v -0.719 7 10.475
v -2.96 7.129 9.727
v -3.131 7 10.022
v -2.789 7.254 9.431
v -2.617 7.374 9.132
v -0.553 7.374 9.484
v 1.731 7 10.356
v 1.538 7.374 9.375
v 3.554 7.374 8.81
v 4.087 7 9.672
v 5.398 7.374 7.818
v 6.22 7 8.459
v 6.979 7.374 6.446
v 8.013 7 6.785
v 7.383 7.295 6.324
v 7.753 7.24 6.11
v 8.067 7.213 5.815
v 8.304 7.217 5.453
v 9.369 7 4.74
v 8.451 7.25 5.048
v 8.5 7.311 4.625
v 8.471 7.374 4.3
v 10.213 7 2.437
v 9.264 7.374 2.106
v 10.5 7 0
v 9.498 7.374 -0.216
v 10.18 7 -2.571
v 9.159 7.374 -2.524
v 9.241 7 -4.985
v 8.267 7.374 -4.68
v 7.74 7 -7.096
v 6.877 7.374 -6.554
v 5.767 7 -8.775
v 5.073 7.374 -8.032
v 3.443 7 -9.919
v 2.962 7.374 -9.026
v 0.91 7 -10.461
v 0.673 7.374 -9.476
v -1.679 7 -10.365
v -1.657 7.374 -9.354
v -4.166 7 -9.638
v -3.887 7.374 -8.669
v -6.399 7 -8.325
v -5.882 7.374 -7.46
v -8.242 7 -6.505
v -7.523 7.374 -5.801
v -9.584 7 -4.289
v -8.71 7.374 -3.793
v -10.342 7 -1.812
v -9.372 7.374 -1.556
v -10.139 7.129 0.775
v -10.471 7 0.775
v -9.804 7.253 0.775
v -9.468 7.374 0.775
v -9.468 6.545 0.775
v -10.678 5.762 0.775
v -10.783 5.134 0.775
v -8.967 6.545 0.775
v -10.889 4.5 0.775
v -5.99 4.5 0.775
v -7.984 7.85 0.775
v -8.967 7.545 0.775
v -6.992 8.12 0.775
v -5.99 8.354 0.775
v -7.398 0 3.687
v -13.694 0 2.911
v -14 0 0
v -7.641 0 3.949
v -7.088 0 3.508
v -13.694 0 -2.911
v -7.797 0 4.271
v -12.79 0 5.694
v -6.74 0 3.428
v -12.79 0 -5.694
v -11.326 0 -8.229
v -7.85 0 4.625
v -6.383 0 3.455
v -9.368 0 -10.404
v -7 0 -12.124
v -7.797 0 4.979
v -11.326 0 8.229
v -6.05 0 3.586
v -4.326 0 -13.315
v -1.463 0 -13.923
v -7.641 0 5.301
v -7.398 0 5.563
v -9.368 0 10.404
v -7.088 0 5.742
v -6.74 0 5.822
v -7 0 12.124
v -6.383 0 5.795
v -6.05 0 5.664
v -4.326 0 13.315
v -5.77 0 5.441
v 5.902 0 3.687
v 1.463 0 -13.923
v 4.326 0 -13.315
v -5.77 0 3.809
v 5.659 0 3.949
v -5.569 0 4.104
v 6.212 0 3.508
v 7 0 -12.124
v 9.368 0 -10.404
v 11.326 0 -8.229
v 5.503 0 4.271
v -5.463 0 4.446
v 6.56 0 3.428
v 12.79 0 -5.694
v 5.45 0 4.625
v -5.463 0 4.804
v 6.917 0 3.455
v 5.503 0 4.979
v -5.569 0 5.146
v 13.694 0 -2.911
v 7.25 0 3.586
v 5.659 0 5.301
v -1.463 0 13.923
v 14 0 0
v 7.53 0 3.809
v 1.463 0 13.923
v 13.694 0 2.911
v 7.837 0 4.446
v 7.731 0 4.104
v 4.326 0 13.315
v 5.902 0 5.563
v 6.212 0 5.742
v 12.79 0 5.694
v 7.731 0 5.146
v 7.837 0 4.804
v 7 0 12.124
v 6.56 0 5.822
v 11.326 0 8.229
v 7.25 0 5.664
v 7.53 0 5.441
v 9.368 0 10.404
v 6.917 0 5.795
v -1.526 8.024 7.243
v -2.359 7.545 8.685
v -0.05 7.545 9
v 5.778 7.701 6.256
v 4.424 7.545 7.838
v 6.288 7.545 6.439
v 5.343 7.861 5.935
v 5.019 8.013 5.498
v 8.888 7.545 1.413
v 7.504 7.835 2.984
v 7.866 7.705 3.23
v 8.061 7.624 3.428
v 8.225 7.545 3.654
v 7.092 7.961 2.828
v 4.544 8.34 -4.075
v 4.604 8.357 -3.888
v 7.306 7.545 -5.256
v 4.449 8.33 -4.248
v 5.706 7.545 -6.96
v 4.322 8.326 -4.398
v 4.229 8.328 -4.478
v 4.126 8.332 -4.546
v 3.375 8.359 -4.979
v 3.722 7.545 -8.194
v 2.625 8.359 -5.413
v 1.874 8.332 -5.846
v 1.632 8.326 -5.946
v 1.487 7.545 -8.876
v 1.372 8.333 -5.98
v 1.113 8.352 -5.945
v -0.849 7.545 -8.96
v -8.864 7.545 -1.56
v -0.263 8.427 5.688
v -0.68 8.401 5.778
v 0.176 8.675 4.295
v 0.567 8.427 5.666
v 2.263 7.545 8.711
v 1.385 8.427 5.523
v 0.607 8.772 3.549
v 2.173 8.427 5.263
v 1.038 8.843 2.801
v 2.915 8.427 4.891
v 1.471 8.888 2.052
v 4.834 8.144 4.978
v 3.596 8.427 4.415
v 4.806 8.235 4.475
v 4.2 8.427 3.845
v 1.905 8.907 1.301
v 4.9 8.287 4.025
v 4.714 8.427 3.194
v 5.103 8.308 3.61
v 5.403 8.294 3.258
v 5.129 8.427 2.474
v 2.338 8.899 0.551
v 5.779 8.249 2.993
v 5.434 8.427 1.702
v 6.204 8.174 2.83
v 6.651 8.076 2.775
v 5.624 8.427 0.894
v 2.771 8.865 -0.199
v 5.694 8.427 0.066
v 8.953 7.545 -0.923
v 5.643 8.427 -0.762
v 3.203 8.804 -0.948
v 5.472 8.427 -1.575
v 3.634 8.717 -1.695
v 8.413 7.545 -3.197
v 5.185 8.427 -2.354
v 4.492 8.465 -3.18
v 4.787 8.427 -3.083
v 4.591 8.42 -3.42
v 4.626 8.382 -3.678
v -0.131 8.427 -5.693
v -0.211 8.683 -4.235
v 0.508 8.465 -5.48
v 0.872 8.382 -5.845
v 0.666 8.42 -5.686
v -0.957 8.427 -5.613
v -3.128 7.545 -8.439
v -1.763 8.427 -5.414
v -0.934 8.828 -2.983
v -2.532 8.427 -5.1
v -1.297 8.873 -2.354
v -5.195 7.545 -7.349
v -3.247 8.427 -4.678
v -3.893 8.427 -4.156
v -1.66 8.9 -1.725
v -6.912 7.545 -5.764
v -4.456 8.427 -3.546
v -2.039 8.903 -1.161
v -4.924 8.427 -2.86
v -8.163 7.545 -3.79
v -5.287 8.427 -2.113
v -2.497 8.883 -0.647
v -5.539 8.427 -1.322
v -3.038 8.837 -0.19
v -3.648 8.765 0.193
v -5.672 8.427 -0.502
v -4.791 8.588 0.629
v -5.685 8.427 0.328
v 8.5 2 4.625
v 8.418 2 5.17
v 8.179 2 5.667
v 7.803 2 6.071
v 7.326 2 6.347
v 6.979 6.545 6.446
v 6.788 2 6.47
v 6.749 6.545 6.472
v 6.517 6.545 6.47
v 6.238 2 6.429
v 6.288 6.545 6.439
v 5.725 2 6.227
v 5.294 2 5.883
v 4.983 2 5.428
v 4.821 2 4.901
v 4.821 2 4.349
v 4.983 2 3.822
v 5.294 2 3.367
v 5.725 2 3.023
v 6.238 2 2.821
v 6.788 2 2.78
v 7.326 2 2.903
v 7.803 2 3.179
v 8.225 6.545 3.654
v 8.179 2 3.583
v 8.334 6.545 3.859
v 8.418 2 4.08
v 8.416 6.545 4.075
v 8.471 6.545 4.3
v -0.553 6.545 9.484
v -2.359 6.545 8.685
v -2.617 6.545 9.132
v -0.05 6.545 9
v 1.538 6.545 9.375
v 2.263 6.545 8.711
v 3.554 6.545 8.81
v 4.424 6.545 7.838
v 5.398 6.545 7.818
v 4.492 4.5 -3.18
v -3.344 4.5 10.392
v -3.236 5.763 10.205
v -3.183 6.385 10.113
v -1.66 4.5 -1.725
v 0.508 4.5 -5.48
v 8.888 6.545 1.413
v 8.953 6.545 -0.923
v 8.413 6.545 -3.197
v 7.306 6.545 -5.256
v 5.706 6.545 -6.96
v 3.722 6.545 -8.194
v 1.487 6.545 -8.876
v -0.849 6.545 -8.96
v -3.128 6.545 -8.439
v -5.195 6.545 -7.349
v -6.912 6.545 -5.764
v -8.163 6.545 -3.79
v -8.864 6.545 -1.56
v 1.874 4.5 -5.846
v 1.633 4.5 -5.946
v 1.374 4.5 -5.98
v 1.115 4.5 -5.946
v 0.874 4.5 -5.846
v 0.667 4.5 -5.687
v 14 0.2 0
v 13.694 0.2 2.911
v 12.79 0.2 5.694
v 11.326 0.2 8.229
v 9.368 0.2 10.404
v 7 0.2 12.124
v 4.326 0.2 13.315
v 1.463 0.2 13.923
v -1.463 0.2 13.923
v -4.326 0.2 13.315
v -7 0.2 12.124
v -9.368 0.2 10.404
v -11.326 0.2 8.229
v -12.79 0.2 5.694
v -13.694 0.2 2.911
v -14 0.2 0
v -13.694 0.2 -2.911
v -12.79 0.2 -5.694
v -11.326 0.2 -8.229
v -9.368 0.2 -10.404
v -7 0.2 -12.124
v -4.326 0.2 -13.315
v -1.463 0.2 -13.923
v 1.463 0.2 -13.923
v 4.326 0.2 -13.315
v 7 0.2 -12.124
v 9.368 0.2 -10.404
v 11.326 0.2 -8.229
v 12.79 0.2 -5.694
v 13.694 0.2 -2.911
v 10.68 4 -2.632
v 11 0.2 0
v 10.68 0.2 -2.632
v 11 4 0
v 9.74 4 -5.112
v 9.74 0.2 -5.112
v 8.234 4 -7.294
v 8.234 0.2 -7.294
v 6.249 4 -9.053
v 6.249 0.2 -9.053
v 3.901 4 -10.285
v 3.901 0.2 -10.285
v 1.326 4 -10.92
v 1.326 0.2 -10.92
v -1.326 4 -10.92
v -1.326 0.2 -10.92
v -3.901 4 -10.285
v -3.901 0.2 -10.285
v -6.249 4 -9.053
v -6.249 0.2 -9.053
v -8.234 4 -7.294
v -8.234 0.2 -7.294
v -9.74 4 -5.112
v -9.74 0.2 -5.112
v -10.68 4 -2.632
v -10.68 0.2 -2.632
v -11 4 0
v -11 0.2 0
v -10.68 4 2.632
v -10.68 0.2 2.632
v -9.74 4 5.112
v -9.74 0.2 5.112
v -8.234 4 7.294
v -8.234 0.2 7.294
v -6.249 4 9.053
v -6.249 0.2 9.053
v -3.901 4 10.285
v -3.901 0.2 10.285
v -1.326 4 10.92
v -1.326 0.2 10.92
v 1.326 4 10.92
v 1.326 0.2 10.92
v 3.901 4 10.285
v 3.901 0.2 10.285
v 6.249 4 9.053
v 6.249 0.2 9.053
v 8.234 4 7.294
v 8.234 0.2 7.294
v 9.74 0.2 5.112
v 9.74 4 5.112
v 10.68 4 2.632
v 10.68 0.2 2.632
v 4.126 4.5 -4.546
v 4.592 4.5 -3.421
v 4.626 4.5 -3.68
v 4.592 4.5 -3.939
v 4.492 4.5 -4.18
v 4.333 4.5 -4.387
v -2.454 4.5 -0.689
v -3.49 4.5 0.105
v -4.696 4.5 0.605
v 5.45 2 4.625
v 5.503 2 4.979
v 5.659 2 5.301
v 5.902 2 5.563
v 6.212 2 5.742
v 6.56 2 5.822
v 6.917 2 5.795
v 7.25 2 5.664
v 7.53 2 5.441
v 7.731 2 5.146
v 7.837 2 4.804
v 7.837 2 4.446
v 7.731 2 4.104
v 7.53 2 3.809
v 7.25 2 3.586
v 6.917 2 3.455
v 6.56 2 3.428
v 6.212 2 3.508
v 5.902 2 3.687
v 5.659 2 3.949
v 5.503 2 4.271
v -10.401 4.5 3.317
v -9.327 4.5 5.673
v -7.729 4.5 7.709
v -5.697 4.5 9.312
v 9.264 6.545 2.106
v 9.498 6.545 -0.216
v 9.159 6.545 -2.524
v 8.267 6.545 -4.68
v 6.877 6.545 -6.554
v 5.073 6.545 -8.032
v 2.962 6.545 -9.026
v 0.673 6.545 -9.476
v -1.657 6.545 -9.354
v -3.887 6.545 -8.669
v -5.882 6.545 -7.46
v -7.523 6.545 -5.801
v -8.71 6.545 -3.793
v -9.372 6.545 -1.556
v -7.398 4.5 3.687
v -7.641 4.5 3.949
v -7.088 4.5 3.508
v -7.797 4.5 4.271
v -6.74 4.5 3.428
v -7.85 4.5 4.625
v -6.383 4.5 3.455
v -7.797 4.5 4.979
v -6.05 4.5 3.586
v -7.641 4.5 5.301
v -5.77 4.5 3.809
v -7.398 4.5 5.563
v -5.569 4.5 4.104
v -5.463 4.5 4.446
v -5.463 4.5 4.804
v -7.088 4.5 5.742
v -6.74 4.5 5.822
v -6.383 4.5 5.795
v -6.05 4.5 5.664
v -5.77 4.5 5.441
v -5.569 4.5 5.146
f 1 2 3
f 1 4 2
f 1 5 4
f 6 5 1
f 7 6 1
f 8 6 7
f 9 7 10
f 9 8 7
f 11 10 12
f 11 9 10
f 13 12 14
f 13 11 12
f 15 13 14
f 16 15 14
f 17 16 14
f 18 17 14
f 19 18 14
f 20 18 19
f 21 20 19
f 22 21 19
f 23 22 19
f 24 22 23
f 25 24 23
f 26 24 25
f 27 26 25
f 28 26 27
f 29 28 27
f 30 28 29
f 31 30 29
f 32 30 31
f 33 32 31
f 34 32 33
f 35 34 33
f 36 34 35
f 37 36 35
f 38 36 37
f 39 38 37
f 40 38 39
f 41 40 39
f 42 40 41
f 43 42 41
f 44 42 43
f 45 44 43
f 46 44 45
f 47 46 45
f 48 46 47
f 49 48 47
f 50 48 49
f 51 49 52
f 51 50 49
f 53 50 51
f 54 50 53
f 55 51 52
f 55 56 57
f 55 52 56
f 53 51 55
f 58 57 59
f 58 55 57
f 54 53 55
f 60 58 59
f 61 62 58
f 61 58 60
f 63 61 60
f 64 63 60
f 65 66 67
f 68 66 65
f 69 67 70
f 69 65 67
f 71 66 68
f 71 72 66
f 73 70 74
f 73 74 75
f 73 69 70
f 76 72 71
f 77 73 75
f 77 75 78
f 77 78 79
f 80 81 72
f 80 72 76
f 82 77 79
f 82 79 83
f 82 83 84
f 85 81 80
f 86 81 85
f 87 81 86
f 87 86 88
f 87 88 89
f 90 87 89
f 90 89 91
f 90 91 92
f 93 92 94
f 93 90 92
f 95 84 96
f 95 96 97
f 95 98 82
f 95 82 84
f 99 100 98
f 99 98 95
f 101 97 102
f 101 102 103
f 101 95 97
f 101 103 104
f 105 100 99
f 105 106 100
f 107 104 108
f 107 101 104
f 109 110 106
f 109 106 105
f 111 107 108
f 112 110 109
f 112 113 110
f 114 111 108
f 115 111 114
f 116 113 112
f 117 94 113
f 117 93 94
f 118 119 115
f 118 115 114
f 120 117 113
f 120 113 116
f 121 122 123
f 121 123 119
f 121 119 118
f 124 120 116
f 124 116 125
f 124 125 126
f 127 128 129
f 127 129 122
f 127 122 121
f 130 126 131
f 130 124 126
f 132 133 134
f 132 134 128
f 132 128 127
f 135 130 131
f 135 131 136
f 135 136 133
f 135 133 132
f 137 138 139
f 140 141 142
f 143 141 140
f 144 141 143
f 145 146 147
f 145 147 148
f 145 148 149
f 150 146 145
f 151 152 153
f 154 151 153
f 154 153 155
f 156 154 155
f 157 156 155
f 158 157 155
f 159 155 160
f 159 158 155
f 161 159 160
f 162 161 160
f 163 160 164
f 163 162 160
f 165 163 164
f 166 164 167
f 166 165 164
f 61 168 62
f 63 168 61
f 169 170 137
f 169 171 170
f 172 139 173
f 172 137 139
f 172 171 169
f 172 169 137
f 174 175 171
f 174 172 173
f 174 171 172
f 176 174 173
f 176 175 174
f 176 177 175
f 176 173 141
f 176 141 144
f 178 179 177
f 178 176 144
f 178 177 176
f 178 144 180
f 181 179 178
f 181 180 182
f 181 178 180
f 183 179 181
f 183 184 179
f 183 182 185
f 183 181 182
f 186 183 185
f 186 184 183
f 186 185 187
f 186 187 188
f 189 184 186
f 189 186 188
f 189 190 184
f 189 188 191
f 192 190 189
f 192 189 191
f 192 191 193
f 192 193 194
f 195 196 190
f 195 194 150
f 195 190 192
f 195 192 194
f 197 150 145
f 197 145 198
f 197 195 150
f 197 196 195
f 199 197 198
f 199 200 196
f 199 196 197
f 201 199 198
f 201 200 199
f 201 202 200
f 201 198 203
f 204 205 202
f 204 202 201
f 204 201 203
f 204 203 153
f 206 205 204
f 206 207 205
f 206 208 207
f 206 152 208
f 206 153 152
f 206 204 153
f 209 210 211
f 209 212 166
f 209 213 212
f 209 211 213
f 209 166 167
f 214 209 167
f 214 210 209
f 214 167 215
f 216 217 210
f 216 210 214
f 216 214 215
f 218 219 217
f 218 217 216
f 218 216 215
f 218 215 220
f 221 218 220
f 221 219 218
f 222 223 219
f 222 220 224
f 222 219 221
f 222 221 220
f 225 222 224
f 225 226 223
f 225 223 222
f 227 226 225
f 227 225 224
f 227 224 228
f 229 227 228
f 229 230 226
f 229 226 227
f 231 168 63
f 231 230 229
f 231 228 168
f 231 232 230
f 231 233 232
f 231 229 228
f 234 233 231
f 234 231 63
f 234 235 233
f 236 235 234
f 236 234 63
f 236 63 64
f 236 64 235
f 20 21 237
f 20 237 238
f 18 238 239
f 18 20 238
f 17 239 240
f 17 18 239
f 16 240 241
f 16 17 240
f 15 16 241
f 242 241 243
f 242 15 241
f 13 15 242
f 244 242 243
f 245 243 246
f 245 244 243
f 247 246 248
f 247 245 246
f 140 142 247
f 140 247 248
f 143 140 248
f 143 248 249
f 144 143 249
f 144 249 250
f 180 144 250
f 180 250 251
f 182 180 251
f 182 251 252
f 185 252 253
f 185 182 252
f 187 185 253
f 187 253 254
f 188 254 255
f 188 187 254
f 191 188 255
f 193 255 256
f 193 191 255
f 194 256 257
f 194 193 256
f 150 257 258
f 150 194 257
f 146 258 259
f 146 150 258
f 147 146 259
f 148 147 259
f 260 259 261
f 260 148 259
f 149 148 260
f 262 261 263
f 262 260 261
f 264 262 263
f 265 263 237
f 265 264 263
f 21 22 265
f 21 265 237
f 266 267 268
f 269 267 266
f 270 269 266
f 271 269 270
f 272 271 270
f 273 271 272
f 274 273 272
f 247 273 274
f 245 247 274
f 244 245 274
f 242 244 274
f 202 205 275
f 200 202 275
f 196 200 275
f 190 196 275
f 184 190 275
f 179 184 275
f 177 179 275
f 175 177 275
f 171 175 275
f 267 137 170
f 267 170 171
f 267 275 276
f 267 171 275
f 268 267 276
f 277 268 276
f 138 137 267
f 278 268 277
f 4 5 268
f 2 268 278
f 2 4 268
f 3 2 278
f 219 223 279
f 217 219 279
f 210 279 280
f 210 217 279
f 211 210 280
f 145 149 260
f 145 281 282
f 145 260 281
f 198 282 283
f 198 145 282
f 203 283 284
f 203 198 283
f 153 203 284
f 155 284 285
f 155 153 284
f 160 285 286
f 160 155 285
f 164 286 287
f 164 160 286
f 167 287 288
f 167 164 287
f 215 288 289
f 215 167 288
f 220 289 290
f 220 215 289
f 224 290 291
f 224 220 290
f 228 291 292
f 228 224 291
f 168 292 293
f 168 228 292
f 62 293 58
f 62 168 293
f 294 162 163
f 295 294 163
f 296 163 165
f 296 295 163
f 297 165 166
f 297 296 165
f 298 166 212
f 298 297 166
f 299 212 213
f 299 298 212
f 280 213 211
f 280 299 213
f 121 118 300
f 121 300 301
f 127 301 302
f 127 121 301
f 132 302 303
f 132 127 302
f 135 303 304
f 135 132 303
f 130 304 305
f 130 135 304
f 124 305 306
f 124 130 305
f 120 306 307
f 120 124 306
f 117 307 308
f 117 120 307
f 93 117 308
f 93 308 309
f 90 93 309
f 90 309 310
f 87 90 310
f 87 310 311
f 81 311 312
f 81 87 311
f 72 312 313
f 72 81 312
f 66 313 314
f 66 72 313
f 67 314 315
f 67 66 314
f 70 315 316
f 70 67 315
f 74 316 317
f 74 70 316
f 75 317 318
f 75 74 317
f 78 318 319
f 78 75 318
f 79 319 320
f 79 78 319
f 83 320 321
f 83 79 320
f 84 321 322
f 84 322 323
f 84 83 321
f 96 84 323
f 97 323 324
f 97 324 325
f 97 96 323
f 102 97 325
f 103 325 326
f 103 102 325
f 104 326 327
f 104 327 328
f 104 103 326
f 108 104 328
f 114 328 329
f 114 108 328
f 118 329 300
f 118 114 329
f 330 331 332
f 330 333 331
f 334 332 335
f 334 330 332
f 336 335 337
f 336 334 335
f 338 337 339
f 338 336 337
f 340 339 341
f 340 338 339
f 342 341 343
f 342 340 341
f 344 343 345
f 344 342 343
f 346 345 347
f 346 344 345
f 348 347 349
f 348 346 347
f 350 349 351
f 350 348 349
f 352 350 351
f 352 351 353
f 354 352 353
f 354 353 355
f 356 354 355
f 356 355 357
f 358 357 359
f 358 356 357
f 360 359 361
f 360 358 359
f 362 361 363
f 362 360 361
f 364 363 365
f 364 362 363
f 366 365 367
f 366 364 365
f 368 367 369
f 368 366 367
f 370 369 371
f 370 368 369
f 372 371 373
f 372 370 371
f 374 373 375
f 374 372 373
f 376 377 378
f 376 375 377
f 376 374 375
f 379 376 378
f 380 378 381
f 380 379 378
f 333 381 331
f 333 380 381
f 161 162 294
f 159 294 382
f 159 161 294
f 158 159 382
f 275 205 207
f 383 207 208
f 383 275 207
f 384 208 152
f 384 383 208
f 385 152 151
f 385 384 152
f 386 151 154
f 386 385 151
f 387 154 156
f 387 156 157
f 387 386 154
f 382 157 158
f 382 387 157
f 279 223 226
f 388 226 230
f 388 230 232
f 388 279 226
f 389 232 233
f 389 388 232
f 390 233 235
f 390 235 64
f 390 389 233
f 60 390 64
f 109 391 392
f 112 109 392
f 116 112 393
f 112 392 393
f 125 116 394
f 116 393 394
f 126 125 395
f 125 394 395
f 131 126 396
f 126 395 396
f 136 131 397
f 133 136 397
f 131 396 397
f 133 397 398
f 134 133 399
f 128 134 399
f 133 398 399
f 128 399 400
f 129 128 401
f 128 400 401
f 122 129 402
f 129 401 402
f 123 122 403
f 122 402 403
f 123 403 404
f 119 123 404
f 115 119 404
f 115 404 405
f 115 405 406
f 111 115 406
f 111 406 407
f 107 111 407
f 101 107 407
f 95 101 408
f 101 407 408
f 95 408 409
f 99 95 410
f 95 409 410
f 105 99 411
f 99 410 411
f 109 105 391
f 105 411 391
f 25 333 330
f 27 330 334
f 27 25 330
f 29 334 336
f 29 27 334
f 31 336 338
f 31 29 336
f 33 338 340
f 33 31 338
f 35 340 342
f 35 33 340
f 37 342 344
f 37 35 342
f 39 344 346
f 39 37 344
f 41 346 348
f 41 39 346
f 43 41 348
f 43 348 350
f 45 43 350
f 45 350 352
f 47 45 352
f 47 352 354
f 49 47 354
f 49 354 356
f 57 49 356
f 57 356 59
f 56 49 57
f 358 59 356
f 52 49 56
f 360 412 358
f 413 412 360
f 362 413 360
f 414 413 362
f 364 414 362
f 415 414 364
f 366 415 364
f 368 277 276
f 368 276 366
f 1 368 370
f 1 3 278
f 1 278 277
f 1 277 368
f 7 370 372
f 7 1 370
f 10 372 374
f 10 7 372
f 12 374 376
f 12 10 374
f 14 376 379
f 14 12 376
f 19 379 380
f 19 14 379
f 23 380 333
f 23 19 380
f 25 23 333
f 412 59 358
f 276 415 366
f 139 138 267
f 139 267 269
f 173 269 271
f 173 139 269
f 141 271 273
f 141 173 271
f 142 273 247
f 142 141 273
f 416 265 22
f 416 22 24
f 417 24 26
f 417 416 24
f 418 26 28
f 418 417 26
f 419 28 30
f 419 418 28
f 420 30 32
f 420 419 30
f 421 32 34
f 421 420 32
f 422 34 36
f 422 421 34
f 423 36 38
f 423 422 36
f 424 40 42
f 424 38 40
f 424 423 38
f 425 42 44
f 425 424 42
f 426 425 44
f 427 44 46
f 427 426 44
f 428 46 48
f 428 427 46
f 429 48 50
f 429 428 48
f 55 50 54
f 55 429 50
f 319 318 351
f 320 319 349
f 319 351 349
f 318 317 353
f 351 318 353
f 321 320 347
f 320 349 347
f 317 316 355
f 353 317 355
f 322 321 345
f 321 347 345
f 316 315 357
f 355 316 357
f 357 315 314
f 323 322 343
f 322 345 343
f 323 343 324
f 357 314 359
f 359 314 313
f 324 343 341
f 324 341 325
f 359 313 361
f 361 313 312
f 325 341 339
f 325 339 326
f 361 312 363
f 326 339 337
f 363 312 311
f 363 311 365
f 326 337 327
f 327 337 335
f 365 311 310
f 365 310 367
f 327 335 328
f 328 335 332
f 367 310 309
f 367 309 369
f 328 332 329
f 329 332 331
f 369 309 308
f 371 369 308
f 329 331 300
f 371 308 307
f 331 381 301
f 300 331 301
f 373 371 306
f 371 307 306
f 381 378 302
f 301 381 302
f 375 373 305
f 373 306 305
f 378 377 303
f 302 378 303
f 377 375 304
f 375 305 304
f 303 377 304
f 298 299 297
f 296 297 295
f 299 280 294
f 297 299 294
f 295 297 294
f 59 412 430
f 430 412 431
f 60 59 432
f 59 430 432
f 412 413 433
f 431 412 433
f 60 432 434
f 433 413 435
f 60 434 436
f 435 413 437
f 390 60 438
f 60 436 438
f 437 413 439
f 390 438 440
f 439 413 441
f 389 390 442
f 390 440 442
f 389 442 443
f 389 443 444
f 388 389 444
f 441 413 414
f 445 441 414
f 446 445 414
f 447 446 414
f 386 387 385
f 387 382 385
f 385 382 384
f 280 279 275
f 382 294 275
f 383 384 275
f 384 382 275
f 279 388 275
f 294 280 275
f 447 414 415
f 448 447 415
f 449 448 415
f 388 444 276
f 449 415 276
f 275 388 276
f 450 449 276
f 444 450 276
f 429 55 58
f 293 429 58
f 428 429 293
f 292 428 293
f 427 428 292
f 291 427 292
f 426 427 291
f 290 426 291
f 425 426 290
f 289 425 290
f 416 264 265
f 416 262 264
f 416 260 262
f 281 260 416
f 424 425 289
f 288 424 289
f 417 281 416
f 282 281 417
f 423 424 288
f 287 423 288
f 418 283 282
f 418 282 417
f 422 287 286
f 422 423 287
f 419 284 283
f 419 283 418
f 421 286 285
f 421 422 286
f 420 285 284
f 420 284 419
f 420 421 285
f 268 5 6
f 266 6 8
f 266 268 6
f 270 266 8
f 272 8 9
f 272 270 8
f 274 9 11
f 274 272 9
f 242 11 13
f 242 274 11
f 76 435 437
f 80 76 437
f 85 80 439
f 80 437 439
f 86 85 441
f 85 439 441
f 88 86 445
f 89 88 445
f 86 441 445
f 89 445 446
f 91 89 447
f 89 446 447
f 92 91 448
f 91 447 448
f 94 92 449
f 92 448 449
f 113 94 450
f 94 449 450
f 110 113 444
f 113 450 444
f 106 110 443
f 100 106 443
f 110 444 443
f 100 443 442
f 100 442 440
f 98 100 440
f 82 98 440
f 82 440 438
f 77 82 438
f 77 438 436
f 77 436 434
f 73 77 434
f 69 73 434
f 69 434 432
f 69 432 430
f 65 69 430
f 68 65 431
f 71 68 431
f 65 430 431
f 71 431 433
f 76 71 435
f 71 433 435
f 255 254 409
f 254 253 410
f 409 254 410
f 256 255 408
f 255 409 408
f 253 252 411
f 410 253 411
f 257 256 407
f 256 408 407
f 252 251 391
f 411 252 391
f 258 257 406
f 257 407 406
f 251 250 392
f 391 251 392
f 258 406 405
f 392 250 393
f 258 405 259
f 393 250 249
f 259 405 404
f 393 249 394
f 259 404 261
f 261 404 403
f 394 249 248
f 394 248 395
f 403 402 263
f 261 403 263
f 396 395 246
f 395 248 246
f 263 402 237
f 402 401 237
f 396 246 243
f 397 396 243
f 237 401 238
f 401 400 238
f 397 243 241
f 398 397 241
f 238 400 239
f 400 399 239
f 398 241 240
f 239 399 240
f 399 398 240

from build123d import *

# Parameters (mm, degrees)
F3_R      = 1.85
F4_DEPTH  = 7
F5_R      = 1.2
F6_DEPTH  = 2
F8_DEPTH  = 4.5
F9_R      = 1
F10_R     = 1.2
F11_DEPTH = 4.5
F12_R     = 5
F13_R     = 14
F13_R_2   = 11
F14_DEPTH = 0.2


with BuildPart() as f1:
    # F0 (on Top) → F1 (revolve)
    with BuildSketch(Plane.XY):
        with BuildLine():
            Line((0, 9), (0, 0))
            Line((0, 0), (11, 0))
            Line((11, 0), (11, 4))
            Line((11, 4), (10.5, 7))
            ThreePointArc((10.5, 7), (10.0017468007, 7.1915925315), (9.5, 7.3738398822))
            Line((9.5, 7.3738398822), (9.5, 6.5449972332))
            Line((9.5, 6.5449972332), (9, 6.5449972332))
            Line((9, 6.5449972332), (9, 7.5449972332))
            ThreePointArc((9, 7.5449972332), (4.5584271698, 8.6339031037), (0, 9))
        make_face()
    revolve(axis=Axis((0, 4.5, 0), (0, 1, 0)))

    # F3 (on offset) → F4 (cut)
    with BuildSketch(Plane.XZ.offset(-9)):
        with Locations((6.65, 4.625)):
            Circle(F3_R)
    extrude(amount=F4_DEPTH, mode=Mode.SUBTRACT)

    # F5 (on face) → F6 (cut, through all)
    with BuildSketch(Plane(origin=(0, 2, 0), x_dir=(-1, 0, 0), z_dir=(0, 1, 0))):
        with Locations((-6.65, 4.625)):
            Circle(F5_R)
    extrude(amount=-F6_DEPTH, mode=Mode.SUBTRACT)

    # F7 (on offset) → F8 (cut)
    with BuildSketch(Plane.XZ.offset(-9)):
        with BuildLine():
            Line((4.9918584287, -4.0461524227), (-3.38657071, 10.4657125331))
            ThreePointArc((-3.38657071, 10.4657125331), (-8.661662033, 6.780531751), (-10.9726648996, 0.775))
            Line((-10.9726648996, 0.775), (-3.1032576969, 0.775))
            Line((-3.1032576969, 0.775), (1.0081415713, -6.3461524227))
            Line((1.0081415713, -6.3461524227), (4.9918584287, -4.0461524227))
        make_face()
    extrude(amount=F8_DEPTH, mode=Mode.SUBTRACT)

    # F9
    f9_edges = [f1.edges().sort_by_distance(p)[0] for p in [
        (4.991858, 6.383907, -4.046152),
        (1.008142, 6.383907, -6.346152),
    ]]
    fillet(f9_edges, radius=F9_R)

    # F10 (on face) → F11 (cut, through all)
    with BuildSketch(Plane(origin=(0, 4.5, 0), x_dir=(-1, 0, 0), z_dir=(0, 1, 0))):
        with Locations((6.65, 4.625)):
            Circle(F10_R)
    extrude(amount=-F11_DEPTH, mode=Mode.SUBTRACT)

    # F12
    f12_edges = [f1.edges().sort_by_distance(p)[0] for p in [
        (-3.103258, 6.66017, 0.775),
    ]]
    fillet(f12_edges, radius=F12_R)

    # F13 (on face) → F14 (join)
    with BuildSketch(Plane.XZ):
        Circle(F13_R)
        Circle(F13_R_2, mode=Mode.SUBTRACT)
    extrude(amount=-F14_DEPTH)


solid = f1.part
